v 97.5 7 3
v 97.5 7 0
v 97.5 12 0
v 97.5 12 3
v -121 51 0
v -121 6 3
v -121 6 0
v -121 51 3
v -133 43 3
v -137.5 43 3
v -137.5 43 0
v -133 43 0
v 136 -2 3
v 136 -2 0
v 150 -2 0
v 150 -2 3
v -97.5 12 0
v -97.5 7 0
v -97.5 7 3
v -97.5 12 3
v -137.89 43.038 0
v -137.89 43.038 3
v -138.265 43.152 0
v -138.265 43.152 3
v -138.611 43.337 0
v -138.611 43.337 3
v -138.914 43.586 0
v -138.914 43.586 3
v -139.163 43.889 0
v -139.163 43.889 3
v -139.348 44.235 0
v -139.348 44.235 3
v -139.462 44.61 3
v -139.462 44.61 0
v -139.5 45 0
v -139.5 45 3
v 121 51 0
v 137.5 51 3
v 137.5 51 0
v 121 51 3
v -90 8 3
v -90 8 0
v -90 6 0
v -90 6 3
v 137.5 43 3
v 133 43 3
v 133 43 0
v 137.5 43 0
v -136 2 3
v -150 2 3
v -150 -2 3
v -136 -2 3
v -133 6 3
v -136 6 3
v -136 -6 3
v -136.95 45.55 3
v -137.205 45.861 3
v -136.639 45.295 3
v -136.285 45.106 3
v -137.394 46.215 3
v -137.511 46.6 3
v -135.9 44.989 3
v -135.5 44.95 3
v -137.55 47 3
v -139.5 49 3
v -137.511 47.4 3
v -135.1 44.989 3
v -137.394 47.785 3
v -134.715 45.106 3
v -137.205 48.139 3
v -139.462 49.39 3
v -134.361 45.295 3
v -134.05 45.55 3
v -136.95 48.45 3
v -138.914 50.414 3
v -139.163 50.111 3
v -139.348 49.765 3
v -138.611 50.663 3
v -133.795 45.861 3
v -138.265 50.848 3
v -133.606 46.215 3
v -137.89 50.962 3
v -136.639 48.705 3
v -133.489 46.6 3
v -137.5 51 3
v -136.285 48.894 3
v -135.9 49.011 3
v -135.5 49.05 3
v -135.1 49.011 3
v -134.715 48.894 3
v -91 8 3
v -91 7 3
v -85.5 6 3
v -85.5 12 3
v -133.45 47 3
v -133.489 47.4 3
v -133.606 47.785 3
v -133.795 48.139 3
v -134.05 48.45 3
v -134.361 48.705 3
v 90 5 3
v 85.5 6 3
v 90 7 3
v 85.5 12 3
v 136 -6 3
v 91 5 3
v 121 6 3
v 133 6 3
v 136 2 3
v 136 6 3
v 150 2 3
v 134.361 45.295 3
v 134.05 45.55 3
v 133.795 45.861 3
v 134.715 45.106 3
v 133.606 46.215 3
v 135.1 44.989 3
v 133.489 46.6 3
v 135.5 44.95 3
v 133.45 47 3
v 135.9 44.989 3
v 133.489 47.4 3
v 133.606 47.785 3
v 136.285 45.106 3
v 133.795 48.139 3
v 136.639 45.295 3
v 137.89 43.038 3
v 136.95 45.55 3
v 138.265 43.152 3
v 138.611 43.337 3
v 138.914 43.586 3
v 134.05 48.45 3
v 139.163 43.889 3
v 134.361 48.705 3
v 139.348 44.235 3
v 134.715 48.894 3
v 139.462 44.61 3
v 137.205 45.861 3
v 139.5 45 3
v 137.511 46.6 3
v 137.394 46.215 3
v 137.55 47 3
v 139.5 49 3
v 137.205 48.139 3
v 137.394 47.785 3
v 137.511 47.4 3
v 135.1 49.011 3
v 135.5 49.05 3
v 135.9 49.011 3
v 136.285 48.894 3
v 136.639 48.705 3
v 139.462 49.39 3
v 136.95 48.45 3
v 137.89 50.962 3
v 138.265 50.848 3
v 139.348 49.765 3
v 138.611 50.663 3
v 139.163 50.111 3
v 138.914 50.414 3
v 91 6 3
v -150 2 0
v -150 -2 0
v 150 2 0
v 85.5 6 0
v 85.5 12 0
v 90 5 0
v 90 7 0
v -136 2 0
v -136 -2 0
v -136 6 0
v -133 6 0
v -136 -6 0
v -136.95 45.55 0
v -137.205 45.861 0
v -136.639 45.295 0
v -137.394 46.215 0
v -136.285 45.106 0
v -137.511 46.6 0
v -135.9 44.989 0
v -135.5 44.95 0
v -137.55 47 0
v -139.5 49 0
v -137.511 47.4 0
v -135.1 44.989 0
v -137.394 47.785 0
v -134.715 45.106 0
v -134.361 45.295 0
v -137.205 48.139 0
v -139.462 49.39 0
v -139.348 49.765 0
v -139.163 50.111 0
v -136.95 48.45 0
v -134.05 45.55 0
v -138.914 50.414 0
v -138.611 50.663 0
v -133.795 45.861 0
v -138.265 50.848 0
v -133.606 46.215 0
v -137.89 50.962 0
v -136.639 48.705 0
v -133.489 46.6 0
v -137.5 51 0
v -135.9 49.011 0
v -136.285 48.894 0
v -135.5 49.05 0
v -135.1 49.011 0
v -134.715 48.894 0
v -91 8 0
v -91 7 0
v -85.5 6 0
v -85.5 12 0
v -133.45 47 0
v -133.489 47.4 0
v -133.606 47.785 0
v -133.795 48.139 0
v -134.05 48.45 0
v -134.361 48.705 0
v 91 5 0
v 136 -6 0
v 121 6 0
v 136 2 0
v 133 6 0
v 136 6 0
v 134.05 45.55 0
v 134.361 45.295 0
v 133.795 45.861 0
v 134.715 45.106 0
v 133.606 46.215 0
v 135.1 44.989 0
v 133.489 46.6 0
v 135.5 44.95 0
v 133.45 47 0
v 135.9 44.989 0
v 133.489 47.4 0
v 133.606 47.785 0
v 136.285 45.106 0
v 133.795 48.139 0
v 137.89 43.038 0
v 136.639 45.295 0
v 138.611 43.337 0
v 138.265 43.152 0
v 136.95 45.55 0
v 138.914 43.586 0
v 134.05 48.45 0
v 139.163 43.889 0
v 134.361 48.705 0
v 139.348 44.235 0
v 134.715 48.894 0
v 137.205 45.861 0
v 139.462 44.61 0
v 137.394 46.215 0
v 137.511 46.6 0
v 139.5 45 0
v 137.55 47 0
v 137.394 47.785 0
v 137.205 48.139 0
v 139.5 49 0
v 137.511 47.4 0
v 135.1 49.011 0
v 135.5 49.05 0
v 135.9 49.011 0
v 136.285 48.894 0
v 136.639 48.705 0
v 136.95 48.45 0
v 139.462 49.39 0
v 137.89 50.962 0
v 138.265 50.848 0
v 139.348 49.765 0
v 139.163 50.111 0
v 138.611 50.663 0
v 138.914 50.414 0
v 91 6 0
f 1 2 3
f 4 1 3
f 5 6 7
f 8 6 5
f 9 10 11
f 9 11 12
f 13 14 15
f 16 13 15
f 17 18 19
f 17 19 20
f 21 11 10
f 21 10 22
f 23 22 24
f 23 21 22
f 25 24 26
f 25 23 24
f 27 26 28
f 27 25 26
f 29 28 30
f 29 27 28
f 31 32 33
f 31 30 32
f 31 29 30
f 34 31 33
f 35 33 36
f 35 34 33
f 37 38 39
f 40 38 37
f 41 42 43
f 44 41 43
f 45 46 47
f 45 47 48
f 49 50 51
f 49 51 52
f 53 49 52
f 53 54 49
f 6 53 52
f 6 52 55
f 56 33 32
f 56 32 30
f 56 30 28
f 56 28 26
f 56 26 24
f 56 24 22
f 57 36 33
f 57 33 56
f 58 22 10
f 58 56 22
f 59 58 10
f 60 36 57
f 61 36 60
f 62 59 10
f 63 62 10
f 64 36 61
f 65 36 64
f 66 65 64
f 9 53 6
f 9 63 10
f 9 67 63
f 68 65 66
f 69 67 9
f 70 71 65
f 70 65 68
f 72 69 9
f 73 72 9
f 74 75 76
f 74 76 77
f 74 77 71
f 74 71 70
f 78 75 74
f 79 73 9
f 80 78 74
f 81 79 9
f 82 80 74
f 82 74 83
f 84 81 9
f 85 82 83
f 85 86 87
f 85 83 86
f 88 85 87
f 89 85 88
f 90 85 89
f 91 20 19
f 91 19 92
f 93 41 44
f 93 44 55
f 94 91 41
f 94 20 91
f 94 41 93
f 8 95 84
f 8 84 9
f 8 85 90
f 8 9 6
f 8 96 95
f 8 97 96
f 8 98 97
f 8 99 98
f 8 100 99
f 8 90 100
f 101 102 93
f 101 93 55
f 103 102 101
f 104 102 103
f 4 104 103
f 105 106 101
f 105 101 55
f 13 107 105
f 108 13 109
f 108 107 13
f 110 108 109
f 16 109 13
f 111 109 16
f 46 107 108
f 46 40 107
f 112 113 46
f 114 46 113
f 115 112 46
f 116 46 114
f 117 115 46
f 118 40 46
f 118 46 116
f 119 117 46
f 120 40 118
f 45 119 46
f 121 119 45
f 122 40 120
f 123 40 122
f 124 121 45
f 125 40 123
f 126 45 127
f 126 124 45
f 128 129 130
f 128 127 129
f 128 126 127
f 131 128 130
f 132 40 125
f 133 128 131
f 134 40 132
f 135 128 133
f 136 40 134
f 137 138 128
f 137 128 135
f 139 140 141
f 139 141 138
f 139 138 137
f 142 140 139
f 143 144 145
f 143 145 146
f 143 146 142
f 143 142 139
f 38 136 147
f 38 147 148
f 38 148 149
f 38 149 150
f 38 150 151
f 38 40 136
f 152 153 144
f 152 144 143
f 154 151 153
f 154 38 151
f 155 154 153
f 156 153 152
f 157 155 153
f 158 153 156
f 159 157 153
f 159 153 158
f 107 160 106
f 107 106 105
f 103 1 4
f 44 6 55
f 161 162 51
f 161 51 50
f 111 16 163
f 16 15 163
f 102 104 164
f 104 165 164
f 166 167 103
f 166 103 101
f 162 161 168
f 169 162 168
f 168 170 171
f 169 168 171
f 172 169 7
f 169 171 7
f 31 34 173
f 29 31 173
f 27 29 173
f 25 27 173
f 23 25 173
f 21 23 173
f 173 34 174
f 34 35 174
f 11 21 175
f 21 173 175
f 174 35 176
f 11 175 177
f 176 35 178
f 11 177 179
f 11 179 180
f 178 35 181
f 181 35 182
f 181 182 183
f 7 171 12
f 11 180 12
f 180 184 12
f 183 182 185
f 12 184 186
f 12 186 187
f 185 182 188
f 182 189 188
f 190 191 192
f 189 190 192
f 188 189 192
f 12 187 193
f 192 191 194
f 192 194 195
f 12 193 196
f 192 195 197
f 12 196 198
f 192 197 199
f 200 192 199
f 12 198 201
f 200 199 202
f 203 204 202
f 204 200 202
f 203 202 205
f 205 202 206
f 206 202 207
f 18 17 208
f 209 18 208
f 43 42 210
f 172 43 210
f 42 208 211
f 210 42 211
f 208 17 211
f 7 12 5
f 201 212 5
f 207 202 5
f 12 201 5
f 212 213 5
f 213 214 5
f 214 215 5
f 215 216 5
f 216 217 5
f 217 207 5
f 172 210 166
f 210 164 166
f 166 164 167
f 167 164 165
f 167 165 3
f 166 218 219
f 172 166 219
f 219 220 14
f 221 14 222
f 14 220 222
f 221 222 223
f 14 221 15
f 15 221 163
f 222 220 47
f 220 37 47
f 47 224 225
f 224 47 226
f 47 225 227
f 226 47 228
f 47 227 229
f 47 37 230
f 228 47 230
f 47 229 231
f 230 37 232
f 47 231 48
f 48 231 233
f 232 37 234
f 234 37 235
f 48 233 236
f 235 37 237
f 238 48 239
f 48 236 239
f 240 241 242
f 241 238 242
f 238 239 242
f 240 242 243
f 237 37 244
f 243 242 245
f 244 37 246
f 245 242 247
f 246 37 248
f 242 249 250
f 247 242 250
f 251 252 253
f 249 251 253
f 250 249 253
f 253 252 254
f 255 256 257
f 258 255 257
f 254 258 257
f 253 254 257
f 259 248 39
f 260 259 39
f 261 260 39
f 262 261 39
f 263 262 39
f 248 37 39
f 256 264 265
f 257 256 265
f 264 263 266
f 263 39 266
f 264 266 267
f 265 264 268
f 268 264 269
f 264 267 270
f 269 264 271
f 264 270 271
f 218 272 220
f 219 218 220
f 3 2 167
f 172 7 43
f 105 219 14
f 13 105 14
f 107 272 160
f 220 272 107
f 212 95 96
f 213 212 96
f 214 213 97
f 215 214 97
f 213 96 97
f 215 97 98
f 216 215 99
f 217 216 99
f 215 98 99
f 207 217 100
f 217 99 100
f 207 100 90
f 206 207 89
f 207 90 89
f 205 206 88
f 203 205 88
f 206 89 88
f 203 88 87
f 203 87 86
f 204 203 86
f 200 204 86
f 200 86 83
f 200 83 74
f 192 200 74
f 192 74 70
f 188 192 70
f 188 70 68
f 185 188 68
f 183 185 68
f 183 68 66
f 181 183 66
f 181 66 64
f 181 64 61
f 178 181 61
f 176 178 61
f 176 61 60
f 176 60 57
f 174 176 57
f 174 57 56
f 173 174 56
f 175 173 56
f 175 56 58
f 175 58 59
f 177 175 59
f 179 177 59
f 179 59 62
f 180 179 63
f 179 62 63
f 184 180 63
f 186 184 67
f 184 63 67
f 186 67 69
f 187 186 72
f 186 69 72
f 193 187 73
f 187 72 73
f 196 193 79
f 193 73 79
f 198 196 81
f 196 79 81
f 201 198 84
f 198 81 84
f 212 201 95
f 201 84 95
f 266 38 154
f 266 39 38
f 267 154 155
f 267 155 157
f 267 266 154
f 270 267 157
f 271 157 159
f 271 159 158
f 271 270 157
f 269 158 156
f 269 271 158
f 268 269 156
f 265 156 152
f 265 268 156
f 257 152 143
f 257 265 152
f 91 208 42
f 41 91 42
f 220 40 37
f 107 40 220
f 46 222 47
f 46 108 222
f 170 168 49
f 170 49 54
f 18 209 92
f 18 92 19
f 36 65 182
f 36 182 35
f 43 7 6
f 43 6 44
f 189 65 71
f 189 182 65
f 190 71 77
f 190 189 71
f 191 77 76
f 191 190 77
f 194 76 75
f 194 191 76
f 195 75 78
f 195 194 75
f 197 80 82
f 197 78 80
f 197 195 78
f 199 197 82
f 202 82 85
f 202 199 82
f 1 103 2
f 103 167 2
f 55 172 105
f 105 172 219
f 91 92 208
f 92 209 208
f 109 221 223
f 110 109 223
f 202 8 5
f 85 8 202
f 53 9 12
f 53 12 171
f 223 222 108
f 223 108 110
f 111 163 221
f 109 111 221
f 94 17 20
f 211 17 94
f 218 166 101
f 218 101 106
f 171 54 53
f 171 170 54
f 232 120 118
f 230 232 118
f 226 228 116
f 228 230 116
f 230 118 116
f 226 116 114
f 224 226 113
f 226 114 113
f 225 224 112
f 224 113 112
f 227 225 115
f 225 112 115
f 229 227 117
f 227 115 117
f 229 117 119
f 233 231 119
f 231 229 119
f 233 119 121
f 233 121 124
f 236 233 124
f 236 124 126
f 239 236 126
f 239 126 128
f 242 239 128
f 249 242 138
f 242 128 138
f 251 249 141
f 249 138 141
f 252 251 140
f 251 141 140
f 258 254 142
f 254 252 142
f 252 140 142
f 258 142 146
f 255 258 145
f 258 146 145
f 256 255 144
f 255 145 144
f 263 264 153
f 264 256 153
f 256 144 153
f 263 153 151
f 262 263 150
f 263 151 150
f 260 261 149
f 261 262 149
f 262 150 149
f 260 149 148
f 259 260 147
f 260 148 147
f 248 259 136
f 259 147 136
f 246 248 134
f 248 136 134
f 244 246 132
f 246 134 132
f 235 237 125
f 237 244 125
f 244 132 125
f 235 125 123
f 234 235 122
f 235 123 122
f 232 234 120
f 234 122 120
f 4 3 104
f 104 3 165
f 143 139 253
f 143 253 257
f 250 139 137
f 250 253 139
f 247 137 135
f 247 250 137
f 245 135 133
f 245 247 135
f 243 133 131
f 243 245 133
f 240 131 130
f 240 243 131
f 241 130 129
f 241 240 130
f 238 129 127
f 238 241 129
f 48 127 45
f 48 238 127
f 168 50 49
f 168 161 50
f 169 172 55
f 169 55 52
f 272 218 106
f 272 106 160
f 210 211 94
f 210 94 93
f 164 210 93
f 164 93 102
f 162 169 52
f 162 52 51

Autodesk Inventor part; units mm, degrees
ref_plane "YZ Plane" through (0, 0, 0) normal (1, 0, 0) x (0, 1, 0)
ref_plane "XY Plane" through (0, 0, 0) normal (0, 0, 1) x (1, 0, 0)
sketch "草圖1" plane through (0, 0, 0) normal (0, 0, 1) x (1, 0, 0)
  line L0 (0, 6) -> (0, -6)
  line L1 (0, -6) -> (-136, -6)
  line L2 (-136, -6) -> (-136, 6)
  line L3 (-150, 2) -> (-136, 2)
  line L4 (-136, 2) -> (-136, -2)
  line L5 (-136, -2) -> (-150, -2)
  line L6 (-150, -2) -> (-150, 2)
  line L7 (-210, 0) -> (210, 0) projected
  line L8 (0, -17.4828) -> (0, 62.8971) projected
  line L9 (0, -6) -> (136, -6)
  line L10 (136, -6) -> (136, 6)
  line L11 (150, 2) -> (136, 2)
  line L12 (136, -2) -> (150, -2)
  line L13 (150, -2) -> (150, 2)
  line L14 (136, -6) -> (136, -2)
  line L15 (145, 2) -> (139, 2)
  line L16 (-97.5, 7) -> (-97.5, 12)
  line L17 (-91, 7) -> (-97.5, 7)
  line L18 (97.5, 7) -> (97.5, 12)
  line L19 (97.5, 12) -> (87.5, 12)
  line L20 (90, 7) -> (97.5, 7)
  line L21 (90, 7) -> (90, 5)
  line L22 (90, 5) -> (91, 5)
  line L23 (91, 5) -> (91, 6)
  line L24 (-136, 6) -> (-91, 6)
  line L25 (-85.5, 6) -> (85.5, 6)
  line L26 (91, 6) -> (136, 6)
  line L27 (-85.5, 12) -> (-85.5, 6)
  line L28 (87.5, 12) -> (85.5, 12)
  line L29 (85.5, 12) -> (85.5, 6)
  line L30 (-97.5, 12) -> (-85.5, 12)
  line L31 (-91, 7) -> (-91, 8)
  line L32 (-91, 8) -> (-90, 8)
  line L33 (-90, 8) -> (-90, 7)
  line L34 (-90, 7) -> (-90, 6)
  line L35 (-91, 6) -> (-90, 6)
  point P0 (0, 0)
  point P1 (-136, 2)
  point P2 (136, -6)
  point P3 (136, -2)
  dimension "d2" = 4
  dimension "d14" = 2
  dimension "d17" = 12
  dimension "d57" = 14
  dimension "d58" = 300
  dimension "d62" = 2
  dimension "d63" = 85.5
  dimension "d64" = 85.5
  dimension "d65" = 12
  dimension "d66" = 5
  dimension "d67" = 6
  dimension "d68" = 6.5
  dimension "d69" = 136
  dimension "d70" = 14
  dimension "d71" = 136
  dimension "d72" = 272
extrude "擠出1" add sketch "草圖1" along normal blind 3
ref_plane "工作平面1" through (0, 0, 1.5) normal (0, 0, 1) x (1, 0, 0)
sketch "草圖7" plane through (0, 0, 0) normal (0, 0, -1) x (-1, 0, 0)
  line L0 (-210, 0) -> (210, 0) projected
  circle A0 centre (129.5, 0) radius 12.5
  line L1 (150, -2) -> (136, -2) projected
  line L2 (142, -2) -> (142, 2)
  line L3 (136, 2) -> (150, 2) projected
  line L4 (150, 2) -> (150, -2) projected
  circle A1 centre (129.5, 0) radius 2.05
  line L5 (136, 6) -> (136, 2) projected
  point P0 (0, 0)
  dimension "d36" = 25
  dimension "d38" = 4.1
  dimension "d73" = 6
extrude "擠出5" cut sketch "草圖7" against normal up to surface (3 mm away) contours A1 L0 | L0 A1
sketch "草圖8" plane through (0, 0, 3) normal (0, 0, 1) x (1, 0, 0)
  line L0 (-90, 6) -> (-136, 6) projected
  line L1 (-133, 6) -> (-121, 6)
  line L2 (-121, 6) -> (-121, 51)
  line L3 (-121, 51) -> (-136, 51)
  line L4 (-133, 43) -> (-133, 6)
  line L5 (-136, 6) -> (-136, 2) projected
  line L6 (-136, 51) -> (-139.5, 51)
  line L7 (-139.5, 51) -> (-139.5, 43)
  line L8 (-139.5, 43) -> (-133, 43)
  circle A0 centre (-135.5, 47) radius 2.05
  circle A1 centre (-129.5, 0) radius 2.05 projected
  circle A2 centre (-135.5, 47) radius 6.5 construction
  line L9 (-136, 2) -> (-150, 2) projected
  line L10 (-150, 2) -> (-150, 58.0765) construction
  line L11 (-150, 58.0765) -> (-142, 58.0765) construction
  line L12 (-142, 58.0765) -> (-142, 42.2693) construction
  line L13 (-137.3204, 6) -> (-133, 6)
  line L14 (-133, 6) -> (-133, 16.271)
  circle A3 centre (-129.5, 16.6771) radius 2.05
  circle A4 centre (-129.5, 16.6771) radius 12.5 construction
  point P0 (0, 0)
  point P1 (-91, 6)
  dimension "d55" = 25
  dimension "d41" = 3
  dimension "d42" = 15
  dimension "d43" = 45
  dimension "d45" = 8
  dimension "d50" = 13
  dimension "d51" = 47
  dimension "d52" = 6.5
  dimension "d74" = 6
extrude "擠出6" add sketch "草圖8" against normal up to surface (3 mm away) contours L0 L4 L8 L7 L6 L3 L2 | A1 | A3
fillet "圓角2" radius 2 2 edges at (-139.5, 51, 1.5) (-139.5, 43, 1.5)
mirror "鏡射6" about plane through (0, 0, 0) normal (1, 0, 0) of "擠出5", "擠出6", "圓角2"
properties part number "rod_2" material "密集板"
